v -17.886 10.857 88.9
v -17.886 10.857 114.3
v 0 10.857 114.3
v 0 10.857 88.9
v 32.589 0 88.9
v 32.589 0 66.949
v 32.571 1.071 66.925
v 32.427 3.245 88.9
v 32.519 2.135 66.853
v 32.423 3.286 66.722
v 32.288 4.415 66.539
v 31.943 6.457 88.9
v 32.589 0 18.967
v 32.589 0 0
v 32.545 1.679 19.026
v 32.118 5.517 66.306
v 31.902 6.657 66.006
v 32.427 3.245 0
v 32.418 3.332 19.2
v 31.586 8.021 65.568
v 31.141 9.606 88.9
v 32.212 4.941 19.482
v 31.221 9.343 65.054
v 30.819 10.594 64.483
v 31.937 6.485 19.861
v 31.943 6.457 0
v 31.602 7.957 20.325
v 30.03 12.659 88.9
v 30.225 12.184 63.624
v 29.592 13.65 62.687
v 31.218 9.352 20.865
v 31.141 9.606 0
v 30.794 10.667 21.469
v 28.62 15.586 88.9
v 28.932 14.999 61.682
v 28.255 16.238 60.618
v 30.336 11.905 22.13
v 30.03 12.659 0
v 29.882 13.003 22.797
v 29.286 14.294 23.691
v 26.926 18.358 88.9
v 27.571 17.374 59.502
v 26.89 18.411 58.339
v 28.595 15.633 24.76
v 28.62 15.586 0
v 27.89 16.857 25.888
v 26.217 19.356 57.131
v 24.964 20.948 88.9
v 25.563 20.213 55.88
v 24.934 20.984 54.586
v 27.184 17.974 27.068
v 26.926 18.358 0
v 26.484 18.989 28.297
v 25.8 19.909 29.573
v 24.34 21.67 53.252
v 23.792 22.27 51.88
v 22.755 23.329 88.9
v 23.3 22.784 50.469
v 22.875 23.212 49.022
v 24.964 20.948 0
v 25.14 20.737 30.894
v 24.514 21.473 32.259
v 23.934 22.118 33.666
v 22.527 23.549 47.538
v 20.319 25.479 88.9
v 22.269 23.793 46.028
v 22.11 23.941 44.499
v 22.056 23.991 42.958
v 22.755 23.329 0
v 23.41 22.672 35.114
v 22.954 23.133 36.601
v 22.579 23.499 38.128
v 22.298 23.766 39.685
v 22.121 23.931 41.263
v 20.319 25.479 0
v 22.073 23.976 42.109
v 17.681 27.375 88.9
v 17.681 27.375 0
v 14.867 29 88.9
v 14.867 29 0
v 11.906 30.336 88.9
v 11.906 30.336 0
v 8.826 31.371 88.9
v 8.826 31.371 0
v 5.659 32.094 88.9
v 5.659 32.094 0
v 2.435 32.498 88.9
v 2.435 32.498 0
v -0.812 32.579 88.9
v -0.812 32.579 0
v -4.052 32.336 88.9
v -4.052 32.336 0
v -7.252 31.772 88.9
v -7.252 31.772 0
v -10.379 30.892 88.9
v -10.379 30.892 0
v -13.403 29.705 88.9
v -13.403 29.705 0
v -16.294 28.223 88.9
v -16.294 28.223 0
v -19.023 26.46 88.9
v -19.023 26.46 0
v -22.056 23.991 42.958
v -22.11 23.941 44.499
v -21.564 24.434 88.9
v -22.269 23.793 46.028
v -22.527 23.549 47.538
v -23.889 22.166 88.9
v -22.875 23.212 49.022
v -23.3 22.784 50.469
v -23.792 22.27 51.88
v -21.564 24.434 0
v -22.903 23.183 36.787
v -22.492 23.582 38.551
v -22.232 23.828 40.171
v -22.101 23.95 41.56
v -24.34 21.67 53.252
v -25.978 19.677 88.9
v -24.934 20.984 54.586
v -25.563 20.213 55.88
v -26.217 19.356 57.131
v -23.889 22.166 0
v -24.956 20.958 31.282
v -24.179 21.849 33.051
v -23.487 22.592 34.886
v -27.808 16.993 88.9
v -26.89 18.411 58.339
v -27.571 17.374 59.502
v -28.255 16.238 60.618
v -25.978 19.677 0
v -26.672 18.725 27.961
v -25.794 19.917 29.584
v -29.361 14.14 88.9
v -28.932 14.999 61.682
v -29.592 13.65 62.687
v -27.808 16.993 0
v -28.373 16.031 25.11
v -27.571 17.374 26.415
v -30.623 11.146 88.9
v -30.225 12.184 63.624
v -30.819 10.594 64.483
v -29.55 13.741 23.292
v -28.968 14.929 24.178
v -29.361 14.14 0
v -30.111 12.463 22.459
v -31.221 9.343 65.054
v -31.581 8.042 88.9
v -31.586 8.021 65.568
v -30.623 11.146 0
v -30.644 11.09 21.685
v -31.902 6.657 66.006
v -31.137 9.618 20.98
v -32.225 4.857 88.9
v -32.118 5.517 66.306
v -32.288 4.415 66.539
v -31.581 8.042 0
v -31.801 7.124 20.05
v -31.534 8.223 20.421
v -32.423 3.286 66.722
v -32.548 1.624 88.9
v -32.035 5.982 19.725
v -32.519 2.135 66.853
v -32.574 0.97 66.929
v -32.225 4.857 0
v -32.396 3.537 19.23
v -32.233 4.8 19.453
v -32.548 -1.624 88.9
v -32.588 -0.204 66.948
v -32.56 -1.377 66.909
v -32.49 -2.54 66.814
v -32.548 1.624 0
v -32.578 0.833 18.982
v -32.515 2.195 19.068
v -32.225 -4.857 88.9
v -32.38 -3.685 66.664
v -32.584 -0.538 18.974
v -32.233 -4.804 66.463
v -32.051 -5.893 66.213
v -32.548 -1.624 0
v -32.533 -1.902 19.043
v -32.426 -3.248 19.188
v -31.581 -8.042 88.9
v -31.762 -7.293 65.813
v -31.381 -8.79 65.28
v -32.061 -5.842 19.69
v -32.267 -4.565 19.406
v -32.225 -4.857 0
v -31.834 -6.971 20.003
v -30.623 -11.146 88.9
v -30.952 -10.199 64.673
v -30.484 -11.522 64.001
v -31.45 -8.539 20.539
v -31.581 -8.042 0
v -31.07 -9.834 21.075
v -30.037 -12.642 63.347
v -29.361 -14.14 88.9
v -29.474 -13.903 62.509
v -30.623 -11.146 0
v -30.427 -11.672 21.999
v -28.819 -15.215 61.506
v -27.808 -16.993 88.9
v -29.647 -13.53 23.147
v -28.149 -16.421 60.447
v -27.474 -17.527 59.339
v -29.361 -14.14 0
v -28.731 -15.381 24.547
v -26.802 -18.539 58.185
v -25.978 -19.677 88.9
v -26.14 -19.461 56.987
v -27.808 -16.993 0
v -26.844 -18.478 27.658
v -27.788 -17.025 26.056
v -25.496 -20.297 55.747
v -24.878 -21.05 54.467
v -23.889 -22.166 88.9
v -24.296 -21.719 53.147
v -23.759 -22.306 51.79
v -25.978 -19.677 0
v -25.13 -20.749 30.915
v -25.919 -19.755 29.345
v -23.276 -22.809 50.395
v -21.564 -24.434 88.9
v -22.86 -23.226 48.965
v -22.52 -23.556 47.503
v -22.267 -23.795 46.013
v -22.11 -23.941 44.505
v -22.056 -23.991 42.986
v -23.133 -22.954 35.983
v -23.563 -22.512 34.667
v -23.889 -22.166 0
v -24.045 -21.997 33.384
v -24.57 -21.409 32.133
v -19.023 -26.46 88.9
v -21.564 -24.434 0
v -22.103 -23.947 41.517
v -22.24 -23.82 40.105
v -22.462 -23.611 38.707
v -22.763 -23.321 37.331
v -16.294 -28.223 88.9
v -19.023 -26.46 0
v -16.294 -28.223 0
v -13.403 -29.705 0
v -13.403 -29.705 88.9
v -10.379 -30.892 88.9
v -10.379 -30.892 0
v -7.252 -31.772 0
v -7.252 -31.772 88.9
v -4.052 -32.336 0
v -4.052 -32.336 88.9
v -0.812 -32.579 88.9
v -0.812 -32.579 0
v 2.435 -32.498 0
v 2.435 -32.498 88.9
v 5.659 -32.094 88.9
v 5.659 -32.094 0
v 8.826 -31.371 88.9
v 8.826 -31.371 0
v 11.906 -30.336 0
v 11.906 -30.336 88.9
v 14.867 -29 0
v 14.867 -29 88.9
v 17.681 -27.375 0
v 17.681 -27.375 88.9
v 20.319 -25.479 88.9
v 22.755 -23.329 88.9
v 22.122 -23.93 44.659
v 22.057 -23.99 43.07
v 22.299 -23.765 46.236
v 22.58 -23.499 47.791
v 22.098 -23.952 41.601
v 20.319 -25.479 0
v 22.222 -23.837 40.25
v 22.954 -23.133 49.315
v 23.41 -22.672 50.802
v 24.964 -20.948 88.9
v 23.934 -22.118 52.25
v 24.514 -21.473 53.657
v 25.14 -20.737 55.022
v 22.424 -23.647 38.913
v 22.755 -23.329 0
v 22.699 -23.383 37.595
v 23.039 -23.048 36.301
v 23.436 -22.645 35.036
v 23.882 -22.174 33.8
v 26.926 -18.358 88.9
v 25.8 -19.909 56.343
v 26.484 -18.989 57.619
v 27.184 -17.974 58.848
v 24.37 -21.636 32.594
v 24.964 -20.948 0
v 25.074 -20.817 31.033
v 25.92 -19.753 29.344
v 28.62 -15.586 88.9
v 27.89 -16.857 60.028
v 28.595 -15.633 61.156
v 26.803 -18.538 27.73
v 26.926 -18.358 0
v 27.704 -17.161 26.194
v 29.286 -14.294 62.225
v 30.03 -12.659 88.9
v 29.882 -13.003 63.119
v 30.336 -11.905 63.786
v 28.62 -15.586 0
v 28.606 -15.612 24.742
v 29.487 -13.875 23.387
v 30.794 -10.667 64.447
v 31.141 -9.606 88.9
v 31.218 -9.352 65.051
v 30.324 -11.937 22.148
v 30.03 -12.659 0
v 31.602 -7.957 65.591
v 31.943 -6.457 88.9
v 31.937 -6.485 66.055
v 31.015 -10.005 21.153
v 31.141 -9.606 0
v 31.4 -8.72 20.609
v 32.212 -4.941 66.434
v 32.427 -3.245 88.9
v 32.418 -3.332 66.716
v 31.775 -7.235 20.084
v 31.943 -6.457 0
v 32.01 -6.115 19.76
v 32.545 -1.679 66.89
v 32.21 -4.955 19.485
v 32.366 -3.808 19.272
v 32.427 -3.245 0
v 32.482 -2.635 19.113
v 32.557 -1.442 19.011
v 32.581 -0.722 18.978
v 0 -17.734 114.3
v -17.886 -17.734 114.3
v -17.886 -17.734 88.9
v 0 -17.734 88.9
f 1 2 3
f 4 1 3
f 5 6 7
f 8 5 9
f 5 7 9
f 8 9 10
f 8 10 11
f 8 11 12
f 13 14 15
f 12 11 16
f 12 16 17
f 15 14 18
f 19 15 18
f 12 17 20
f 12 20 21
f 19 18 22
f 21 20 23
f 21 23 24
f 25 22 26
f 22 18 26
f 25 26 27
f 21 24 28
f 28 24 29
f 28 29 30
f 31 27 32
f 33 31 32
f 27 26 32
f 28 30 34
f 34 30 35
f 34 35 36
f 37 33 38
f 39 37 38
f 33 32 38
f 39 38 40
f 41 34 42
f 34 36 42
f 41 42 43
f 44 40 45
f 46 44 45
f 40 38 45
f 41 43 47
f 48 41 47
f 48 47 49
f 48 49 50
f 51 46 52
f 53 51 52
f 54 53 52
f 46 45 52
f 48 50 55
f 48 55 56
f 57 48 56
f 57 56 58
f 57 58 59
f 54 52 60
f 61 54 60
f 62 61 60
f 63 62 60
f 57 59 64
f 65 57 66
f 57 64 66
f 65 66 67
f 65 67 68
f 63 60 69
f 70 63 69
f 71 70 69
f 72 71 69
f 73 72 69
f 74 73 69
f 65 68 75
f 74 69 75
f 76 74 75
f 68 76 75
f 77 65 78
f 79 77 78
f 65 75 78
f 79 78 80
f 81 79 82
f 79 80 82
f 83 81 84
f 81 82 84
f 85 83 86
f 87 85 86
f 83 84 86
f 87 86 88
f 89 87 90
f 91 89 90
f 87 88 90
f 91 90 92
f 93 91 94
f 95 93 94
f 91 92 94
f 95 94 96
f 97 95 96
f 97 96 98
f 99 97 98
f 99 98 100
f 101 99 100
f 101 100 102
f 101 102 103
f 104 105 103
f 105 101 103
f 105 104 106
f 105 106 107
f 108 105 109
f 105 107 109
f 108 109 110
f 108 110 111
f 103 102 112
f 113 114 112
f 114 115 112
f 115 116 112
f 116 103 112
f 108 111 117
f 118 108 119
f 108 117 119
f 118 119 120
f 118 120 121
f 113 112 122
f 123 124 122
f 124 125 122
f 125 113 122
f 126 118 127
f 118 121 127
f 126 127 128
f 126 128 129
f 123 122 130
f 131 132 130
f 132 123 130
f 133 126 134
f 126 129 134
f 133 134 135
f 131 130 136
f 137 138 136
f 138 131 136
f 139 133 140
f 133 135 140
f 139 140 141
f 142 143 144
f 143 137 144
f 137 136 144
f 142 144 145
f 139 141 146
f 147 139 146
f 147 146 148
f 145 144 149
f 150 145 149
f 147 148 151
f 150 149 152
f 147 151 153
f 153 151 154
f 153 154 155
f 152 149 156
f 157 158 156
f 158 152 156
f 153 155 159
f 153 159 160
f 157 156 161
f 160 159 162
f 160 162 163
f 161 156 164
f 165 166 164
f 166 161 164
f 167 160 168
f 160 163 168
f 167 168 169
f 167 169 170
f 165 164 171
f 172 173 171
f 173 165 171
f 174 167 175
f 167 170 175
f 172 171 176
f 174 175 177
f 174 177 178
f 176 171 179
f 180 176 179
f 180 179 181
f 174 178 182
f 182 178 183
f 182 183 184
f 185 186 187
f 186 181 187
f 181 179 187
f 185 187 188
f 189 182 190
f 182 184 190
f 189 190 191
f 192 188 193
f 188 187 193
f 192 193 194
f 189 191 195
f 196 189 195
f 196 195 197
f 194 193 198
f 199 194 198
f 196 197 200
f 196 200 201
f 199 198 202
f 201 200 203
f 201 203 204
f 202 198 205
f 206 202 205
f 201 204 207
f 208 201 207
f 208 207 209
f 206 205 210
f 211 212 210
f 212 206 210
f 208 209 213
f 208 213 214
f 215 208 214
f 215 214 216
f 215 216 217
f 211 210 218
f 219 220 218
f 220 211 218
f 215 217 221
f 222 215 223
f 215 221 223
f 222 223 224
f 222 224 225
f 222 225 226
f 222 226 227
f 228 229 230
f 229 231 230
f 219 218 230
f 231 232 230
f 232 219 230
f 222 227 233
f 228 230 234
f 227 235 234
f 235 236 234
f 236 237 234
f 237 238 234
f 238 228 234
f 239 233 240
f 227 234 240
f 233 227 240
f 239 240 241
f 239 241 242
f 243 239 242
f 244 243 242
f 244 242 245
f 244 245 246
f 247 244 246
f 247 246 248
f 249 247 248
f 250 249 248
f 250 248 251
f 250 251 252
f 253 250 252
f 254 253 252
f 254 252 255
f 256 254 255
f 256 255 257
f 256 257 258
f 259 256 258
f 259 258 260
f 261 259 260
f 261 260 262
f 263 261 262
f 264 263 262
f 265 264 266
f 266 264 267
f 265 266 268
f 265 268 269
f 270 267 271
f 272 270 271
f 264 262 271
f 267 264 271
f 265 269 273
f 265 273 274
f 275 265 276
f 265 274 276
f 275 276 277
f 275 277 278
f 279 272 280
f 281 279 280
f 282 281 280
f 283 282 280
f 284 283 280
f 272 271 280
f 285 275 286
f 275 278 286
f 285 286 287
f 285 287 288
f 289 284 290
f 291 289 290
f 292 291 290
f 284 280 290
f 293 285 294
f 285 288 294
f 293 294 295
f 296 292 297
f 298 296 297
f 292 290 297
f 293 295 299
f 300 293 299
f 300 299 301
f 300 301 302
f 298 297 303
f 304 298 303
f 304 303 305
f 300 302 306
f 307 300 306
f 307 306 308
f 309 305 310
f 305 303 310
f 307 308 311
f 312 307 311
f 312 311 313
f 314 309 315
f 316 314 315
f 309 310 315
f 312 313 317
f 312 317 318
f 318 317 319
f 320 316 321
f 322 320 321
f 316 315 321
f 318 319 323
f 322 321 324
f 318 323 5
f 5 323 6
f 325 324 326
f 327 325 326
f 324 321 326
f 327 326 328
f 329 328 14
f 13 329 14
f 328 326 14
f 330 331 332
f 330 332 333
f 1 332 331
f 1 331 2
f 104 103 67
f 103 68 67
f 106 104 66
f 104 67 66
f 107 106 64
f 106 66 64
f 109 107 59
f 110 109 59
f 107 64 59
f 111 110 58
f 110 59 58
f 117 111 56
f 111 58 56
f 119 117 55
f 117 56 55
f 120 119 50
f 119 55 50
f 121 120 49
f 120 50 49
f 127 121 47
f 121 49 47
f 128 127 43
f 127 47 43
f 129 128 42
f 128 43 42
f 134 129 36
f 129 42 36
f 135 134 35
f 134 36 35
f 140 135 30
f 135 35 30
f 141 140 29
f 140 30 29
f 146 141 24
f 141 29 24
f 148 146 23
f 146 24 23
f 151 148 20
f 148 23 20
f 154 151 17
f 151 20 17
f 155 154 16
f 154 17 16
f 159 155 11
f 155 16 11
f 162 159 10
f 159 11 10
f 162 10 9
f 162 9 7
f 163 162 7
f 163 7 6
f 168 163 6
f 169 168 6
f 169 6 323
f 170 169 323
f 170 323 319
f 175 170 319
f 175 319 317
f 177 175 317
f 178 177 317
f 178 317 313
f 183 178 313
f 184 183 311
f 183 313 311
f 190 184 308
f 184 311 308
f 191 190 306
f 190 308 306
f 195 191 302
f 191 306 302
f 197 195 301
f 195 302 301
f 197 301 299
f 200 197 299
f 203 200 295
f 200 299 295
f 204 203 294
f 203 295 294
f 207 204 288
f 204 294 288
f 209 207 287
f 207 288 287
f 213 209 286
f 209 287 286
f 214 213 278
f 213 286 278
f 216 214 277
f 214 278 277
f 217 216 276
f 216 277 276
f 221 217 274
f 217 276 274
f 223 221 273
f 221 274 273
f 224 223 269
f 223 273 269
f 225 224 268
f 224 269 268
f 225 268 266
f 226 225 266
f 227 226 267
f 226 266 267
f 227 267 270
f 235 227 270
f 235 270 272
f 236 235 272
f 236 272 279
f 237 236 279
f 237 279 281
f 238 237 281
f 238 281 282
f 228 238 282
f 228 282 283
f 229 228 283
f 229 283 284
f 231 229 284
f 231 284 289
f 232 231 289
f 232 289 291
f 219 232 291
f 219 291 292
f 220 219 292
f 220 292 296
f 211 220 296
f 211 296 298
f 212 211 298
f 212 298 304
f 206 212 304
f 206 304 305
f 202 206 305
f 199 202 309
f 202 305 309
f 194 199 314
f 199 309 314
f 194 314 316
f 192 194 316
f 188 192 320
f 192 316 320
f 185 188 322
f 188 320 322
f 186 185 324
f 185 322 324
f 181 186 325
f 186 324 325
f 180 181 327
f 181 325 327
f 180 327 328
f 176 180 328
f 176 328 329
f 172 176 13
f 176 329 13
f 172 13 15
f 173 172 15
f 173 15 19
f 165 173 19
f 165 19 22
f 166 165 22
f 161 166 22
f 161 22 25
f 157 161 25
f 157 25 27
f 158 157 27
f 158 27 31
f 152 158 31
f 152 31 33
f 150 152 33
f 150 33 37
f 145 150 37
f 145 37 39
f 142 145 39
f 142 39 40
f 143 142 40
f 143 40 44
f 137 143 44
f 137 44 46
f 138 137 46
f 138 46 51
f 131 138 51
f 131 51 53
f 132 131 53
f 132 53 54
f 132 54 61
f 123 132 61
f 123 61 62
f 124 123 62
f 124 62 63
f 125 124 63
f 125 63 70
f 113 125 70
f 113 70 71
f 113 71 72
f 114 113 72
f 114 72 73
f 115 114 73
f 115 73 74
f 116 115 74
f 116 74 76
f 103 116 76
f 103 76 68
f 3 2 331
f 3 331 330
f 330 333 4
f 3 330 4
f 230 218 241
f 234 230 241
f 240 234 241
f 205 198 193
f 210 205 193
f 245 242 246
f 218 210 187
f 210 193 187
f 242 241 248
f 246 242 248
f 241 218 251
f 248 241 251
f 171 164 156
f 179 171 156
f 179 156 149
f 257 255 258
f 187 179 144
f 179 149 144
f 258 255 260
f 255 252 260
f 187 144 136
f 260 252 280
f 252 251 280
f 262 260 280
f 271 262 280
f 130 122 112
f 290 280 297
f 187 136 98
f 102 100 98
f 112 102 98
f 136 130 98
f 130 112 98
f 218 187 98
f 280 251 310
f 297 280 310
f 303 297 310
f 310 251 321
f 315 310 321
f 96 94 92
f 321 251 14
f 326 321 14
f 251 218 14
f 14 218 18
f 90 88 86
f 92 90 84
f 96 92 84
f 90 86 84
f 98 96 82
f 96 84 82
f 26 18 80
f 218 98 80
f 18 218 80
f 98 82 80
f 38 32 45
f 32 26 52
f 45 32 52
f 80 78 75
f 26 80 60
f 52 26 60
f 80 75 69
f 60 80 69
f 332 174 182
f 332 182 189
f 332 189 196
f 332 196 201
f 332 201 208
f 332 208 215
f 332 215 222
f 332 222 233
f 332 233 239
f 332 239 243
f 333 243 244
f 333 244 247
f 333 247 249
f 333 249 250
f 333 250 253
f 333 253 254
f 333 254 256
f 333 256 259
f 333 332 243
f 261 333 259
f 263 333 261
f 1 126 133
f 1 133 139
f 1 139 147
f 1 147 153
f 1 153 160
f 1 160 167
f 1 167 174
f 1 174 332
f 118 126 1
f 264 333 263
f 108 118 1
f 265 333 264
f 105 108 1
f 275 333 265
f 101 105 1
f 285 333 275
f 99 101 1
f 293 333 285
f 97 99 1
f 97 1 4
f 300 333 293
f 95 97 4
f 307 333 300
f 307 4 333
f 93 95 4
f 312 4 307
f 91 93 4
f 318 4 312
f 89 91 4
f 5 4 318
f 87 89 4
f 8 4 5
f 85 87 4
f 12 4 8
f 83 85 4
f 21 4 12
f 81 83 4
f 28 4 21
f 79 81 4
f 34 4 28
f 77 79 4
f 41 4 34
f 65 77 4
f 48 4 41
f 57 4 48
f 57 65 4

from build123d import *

# Parameters (mm, degrees)
F0_R     = 32.588749
F1_DEPTH = 88.9
F2_W     = 17.885627
F2_H     = 28.591043
F3_DEPTH = 25.4
F4_R     = 23.990527
F5_DEPTH = 42.545


with BuildPart() as f1:
    # F0 (on Top) → F1 (new body)
    with BuildSketch(Plane.XY):
        Circle(F0_R)
    extrude(amount=F1_DEPTH)

    # F2 (on face) → F3 (join)
    with BuildSketch(Plane.XY.offset(88.9)):
        with Locations((-8.942813, -3.438737)):
            Rectangle(F2_W, F2_H)
    extrude(amount=F3_DEPTH)

    # F4 (on Right) → F5 (cut, symmetric)
    with BuildSketch(Plane.YZ):
        with Locations((0, 42.958003)):
            Circle(F4_R)
    extrude(amount=F5_DEPTH, both=True, mode=Mode.SUBTRACT)


solid = f1.part
